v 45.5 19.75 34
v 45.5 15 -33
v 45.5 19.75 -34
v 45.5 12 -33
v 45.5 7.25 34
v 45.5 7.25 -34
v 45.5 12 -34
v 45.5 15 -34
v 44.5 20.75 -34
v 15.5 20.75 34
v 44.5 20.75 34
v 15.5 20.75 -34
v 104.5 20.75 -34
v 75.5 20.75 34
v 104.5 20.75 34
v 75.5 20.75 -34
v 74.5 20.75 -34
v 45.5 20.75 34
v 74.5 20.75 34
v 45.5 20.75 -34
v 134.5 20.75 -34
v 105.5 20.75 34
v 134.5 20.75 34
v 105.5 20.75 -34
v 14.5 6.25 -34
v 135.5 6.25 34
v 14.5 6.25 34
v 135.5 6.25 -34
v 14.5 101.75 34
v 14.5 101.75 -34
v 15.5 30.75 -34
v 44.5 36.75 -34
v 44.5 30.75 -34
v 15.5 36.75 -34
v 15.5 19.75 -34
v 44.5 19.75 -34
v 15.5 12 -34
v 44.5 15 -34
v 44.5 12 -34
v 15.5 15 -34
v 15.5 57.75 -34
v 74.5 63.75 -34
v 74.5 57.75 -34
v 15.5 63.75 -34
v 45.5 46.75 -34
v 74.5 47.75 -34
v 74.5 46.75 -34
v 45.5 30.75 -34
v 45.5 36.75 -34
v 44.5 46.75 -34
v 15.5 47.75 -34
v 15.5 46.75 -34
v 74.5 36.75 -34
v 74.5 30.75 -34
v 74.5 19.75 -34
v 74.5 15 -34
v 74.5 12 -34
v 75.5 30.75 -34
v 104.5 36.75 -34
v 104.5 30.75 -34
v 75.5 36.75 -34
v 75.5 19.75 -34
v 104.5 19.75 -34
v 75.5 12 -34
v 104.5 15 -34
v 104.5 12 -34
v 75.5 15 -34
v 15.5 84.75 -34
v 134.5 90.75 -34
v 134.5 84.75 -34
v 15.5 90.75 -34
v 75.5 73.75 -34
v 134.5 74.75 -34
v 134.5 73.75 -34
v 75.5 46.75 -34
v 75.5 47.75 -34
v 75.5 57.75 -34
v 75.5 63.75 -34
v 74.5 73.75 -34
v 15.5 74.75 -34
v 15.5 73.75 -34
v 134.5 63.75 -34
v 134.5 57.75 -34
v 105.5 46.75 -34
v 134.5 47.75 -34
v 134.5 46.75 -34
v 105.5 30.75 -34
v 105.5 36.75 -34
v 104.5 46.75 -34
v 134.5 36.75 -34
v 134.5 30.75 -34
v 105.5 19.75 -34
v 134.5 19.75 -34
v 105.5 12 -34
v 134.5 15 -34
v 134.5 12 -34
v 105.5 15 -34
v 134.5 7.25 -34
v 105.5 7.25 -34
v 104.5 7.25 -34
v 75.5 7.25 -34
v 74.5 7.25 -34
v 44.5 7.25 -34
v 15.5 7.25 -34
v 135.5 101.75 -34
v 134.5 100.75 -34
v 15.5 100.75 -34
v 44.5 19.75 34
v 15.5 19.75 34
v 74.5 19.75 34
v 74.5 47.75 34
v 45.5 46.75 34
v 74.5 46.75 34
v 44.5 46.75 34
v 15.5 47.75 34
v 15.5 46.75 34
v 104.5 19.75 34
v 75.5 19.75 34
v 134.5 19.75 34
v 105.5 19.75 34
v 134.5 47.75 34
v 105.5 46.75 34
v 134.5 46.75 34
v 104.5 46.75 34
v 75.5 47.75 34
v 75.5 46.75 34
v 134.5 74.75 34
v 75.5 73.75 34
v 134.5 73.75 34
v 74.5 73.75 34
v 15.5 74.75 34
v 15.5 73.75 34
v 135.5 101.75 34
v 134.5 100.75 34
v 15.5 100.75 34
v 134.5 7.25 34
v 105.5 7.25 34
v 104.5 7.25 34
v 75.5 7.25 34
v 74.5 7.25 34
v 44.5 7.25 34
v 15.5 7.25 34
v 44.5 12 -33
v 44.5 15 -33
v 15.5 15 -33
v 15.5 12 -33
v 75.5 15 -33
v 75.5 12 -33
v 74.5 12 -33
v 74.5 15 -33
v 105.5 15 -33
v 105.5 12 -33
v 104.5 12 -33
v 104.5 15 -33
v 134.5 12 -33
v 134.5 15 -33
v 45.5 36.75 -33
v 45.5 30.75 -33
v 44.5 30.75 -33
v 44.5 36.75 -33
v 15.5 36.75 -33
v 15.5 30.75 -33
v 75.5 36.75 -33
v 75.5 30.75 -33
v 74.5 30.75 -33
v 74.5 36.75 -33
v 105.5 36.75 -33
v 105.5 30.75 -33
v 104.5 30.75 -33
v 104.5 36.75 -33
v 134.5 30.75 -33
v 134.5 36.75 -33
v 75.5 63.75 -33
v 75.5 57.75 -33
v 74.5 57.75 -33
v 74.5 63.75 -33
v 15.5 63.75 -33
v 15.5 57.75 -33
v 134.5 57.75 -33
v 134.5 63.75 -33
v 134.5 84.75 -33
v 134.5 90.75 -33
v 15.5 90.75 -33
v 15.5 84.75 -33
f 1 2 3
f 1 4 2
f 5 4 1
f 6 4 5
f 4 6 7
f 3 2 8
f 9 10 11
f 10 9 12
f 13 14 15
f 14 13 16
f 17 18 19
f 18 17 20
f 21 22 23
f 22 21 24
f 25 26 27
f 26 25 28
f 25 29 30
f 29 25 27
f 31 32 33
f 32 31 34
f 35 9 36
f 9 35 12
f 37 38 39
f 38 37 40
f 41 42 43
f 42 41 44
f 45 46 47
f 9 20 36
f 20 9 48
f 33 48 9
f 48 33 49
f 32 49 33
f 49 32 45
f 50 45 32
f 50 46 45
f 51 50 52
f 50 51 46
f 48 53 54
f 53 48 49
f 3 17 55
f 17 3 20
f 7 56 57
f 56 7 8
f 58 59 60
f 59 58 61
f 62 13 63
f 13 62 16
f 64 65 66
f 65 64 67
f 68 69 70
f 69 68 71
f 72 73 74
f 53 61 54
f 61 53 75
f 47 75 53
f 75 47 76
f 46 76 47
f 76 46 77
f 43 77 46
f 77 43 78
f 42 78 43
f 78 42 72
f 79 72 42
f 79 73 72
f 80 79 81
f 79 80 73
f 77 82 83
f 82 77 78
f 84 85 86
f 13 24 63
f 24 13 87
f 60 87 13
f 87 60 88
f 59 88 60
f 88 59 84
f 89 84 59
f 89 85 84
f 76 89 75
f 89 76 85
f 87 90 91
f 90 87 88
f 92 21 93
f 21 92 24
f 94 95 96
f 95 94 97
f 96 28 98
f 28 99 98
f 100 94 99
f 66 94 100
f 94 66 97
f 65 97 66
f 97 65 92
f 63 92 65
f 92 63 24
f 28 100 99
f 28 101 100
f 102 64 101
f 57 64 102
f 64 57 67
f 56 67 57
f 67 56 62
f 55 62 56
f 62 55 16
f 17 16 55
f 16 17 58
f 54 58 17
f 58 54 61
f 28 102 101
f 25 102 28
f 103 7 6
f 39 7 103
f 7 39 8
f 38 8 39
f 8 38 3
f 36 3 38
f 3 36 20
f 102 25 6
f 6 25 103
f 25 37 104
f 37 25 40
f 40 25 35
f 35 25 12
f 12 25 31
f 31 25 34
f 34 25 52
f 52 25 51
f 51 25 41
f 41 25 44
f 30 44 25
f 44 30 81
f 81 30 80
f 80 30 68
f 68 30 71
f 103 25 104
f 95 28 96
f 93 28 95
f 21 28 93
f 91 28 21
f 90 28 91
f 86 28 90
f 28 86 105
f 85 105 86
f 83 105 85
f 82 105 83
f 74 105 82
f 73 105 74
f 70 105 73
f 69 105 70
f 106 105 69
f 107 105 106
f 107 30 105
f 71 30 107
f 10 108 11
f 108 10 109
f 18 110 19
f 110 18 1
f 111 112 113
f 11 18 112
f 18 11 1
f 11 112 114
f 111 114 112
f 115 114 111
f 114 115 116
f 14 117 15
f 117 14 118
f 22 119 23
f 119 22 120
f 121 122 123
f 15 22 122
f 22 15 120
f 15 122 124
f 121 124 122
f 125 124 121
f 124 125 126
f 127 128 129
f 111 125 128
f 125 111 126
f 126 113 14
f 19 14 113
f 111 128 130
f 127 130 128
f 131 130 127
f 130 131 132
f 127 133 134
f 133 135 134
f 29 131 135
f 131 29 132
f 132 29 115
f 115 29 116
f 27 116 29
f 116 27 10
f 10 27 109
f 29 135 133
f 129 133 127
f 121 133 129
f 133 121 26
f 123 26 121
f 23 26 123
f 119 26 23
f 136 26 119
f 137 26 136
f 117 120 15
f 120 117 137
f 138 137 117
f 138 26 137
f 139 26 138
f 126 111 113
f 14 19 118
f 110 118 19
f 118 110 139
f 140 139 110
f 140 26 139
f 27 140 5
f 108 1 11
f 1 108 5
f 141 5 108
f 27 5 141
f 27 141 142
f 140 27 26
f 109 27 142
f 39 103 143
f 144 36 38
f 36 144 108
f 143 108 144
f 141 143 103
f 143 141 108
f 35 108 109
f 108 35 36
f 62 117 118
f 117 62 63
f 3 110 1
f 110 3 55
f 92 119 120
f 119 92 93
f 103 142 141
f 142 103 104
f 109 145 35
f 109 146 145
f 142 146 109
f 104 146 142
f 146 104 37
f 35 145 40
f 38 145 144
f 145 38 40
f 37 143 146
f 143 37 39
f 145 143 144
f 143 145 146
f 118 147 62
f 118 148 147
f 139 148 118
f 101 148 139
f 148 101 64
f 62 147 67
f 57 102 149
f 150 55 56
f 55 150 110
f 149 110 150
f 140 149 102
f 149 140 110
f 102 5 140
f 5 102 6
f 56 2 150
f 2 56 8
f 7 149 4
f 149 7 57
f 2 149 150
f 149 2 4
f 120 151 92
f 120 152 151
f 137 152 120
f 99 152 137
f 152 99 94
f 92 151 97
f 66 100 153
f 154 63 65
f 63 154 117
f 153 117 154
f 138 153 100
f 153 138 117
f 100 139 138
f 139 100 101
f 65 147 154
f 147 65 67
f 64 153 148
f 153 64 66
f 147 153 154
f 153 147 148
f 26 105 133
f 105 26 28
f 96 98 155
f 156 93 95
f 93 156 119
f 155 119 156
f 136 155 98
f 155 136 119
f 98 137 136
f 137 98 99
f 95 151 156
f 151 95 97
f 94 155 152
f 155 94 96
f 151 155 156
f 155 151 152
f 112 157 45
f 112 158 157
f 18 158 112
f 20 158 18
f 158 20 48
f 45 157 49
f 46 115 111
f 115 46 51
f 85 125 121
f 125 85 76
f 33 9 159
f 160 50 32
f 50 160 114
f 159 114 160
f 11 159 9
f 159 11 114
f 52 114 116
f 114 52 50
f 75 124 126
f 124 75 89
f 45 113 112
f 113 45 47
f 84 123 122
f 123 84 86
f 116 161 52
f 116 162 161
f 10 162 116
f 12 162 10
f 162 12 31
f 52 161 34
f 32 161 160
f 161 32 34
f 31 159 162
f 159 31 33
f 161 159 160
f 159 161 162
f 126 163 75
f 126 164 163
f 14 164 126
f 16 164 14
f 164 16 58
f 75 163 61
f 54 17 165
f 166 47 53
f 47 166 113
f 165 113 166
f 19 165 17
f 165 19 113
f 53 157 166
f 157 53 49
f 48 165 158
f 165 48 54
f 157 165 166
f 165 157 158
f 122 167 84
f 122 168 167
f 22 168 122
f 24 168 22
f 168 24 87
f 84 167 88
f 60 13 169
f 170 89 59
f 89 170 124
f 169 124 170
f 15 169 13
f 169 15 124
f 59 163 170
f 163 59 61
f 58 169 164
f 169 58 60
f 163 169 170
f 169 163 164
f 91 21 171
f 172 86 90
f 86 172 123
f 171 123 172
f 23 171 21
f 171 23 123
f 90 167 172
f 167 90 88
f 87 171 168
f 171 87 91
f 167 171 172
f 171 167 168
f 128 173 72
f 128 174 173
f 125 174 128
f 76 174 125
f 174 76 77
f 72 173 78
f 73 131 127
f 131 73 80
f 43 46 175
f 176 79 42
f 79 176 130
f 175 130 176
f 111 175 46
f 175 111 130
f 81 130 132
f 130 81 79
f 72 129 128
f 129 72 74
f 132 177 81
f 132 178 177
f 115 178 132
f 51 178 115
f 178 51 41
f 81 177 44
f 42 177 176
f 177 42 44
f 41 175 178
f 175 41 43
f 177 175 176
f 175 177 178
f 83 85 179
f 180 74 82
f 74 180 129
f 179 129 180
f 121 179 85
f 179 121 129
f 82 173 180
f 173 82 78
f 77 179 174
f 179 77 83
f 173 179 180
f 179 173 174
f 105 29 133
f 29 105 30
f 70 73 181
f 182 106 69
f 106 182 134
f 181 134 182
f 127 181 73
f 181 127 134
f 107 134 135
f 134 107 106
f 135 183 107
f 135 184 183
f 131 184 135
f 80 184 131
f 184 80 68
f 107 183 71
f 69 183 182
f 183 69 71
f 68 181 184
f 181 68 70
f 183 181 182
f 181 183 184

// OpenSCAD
// [FL_INDEX: keywords="openscad, 3d_parametric, Customisable_Mini_Storage_Drawers, csg_solid" | COT="Parametric OpenSCAD design from 3DCodeverse"]
// Title: Customisable Mini Storage Drawers

// Half height row(s)
half_row = 1; // [0:10]

// Standard height/width row(s)
normal_row = 1; // [0:10]

//Double width row(s)
double_row = 1; // [0:10]

//Quad width row(s)
quad_row = 1; // [0:10]



grid();



module grid (){
rotate(a=[270,0,0]){
	if (half_row > 0) {
		for (row = [1:half_row]) {
			for (col = [1 : 4]) {
				translate(v = [col*30, 0, row*13.5]) {
						half_box();
				}
			}
		}
	}

	if (normal_row > 0) {
		for (row = [1:normal_row]) {
			for (col = [1 : 4]) {
				translate(v = [col*30, 0, row*27+(half_row*13.5-6.75)]) {
						box();
				}
			}
		}
	}

	if (double_row > 0) {
		for (row = [1:double_row]) {
			for (col = [1 : 2]) {
				translate(v = [col*60-15 , 0, row*27+(half_row*13.5-6.75)+(normal_row*27)]) {
						double_box();
				}
			}
		}
	}

	if (quad_row > 0) {
		for (row = [1:quad_row]) {
			translate(v = [75 , 0, row*27+(half_row*13.5-6.75)+(normal_row*27)+(double_row*27)]) {
					quad_box();
			}
		}
	}
}
}




module half_box(){
	difference() {
		cube(size = [31,68,14.5], center = true);
		cube(size = [29,70,12.5], center = true);
	}

	translate(v = [0,33.5,0]) {
		cube(size = [31,1,3], center=true);
	}

}

module box(){
	difference() {
		cube(size = [31,68,28], center = true);
		cube(size = [29,70,26], center = true);
	}

	translate(v = [0,33.5,0]) {
		cube(size = [31,1,6], center=true);
	}
}

module double_box(){
	difference() {
		cube(size = [61,68,28], center = true);
		cube(size = [59,70,26], center = true);
	}

	translate(v = [0,33.5,0]) {
		cube(size = [61,1,6], center=true);
	}
}

module quad_box(){
	difference() {
		cube(size = [121,68,28], center = true);
		cube(size = [119,70,26], center = true);
	}

	translate(v = [0,33.5,0]) {
		cube(size = [121,1,6], center=true);
	}
}
